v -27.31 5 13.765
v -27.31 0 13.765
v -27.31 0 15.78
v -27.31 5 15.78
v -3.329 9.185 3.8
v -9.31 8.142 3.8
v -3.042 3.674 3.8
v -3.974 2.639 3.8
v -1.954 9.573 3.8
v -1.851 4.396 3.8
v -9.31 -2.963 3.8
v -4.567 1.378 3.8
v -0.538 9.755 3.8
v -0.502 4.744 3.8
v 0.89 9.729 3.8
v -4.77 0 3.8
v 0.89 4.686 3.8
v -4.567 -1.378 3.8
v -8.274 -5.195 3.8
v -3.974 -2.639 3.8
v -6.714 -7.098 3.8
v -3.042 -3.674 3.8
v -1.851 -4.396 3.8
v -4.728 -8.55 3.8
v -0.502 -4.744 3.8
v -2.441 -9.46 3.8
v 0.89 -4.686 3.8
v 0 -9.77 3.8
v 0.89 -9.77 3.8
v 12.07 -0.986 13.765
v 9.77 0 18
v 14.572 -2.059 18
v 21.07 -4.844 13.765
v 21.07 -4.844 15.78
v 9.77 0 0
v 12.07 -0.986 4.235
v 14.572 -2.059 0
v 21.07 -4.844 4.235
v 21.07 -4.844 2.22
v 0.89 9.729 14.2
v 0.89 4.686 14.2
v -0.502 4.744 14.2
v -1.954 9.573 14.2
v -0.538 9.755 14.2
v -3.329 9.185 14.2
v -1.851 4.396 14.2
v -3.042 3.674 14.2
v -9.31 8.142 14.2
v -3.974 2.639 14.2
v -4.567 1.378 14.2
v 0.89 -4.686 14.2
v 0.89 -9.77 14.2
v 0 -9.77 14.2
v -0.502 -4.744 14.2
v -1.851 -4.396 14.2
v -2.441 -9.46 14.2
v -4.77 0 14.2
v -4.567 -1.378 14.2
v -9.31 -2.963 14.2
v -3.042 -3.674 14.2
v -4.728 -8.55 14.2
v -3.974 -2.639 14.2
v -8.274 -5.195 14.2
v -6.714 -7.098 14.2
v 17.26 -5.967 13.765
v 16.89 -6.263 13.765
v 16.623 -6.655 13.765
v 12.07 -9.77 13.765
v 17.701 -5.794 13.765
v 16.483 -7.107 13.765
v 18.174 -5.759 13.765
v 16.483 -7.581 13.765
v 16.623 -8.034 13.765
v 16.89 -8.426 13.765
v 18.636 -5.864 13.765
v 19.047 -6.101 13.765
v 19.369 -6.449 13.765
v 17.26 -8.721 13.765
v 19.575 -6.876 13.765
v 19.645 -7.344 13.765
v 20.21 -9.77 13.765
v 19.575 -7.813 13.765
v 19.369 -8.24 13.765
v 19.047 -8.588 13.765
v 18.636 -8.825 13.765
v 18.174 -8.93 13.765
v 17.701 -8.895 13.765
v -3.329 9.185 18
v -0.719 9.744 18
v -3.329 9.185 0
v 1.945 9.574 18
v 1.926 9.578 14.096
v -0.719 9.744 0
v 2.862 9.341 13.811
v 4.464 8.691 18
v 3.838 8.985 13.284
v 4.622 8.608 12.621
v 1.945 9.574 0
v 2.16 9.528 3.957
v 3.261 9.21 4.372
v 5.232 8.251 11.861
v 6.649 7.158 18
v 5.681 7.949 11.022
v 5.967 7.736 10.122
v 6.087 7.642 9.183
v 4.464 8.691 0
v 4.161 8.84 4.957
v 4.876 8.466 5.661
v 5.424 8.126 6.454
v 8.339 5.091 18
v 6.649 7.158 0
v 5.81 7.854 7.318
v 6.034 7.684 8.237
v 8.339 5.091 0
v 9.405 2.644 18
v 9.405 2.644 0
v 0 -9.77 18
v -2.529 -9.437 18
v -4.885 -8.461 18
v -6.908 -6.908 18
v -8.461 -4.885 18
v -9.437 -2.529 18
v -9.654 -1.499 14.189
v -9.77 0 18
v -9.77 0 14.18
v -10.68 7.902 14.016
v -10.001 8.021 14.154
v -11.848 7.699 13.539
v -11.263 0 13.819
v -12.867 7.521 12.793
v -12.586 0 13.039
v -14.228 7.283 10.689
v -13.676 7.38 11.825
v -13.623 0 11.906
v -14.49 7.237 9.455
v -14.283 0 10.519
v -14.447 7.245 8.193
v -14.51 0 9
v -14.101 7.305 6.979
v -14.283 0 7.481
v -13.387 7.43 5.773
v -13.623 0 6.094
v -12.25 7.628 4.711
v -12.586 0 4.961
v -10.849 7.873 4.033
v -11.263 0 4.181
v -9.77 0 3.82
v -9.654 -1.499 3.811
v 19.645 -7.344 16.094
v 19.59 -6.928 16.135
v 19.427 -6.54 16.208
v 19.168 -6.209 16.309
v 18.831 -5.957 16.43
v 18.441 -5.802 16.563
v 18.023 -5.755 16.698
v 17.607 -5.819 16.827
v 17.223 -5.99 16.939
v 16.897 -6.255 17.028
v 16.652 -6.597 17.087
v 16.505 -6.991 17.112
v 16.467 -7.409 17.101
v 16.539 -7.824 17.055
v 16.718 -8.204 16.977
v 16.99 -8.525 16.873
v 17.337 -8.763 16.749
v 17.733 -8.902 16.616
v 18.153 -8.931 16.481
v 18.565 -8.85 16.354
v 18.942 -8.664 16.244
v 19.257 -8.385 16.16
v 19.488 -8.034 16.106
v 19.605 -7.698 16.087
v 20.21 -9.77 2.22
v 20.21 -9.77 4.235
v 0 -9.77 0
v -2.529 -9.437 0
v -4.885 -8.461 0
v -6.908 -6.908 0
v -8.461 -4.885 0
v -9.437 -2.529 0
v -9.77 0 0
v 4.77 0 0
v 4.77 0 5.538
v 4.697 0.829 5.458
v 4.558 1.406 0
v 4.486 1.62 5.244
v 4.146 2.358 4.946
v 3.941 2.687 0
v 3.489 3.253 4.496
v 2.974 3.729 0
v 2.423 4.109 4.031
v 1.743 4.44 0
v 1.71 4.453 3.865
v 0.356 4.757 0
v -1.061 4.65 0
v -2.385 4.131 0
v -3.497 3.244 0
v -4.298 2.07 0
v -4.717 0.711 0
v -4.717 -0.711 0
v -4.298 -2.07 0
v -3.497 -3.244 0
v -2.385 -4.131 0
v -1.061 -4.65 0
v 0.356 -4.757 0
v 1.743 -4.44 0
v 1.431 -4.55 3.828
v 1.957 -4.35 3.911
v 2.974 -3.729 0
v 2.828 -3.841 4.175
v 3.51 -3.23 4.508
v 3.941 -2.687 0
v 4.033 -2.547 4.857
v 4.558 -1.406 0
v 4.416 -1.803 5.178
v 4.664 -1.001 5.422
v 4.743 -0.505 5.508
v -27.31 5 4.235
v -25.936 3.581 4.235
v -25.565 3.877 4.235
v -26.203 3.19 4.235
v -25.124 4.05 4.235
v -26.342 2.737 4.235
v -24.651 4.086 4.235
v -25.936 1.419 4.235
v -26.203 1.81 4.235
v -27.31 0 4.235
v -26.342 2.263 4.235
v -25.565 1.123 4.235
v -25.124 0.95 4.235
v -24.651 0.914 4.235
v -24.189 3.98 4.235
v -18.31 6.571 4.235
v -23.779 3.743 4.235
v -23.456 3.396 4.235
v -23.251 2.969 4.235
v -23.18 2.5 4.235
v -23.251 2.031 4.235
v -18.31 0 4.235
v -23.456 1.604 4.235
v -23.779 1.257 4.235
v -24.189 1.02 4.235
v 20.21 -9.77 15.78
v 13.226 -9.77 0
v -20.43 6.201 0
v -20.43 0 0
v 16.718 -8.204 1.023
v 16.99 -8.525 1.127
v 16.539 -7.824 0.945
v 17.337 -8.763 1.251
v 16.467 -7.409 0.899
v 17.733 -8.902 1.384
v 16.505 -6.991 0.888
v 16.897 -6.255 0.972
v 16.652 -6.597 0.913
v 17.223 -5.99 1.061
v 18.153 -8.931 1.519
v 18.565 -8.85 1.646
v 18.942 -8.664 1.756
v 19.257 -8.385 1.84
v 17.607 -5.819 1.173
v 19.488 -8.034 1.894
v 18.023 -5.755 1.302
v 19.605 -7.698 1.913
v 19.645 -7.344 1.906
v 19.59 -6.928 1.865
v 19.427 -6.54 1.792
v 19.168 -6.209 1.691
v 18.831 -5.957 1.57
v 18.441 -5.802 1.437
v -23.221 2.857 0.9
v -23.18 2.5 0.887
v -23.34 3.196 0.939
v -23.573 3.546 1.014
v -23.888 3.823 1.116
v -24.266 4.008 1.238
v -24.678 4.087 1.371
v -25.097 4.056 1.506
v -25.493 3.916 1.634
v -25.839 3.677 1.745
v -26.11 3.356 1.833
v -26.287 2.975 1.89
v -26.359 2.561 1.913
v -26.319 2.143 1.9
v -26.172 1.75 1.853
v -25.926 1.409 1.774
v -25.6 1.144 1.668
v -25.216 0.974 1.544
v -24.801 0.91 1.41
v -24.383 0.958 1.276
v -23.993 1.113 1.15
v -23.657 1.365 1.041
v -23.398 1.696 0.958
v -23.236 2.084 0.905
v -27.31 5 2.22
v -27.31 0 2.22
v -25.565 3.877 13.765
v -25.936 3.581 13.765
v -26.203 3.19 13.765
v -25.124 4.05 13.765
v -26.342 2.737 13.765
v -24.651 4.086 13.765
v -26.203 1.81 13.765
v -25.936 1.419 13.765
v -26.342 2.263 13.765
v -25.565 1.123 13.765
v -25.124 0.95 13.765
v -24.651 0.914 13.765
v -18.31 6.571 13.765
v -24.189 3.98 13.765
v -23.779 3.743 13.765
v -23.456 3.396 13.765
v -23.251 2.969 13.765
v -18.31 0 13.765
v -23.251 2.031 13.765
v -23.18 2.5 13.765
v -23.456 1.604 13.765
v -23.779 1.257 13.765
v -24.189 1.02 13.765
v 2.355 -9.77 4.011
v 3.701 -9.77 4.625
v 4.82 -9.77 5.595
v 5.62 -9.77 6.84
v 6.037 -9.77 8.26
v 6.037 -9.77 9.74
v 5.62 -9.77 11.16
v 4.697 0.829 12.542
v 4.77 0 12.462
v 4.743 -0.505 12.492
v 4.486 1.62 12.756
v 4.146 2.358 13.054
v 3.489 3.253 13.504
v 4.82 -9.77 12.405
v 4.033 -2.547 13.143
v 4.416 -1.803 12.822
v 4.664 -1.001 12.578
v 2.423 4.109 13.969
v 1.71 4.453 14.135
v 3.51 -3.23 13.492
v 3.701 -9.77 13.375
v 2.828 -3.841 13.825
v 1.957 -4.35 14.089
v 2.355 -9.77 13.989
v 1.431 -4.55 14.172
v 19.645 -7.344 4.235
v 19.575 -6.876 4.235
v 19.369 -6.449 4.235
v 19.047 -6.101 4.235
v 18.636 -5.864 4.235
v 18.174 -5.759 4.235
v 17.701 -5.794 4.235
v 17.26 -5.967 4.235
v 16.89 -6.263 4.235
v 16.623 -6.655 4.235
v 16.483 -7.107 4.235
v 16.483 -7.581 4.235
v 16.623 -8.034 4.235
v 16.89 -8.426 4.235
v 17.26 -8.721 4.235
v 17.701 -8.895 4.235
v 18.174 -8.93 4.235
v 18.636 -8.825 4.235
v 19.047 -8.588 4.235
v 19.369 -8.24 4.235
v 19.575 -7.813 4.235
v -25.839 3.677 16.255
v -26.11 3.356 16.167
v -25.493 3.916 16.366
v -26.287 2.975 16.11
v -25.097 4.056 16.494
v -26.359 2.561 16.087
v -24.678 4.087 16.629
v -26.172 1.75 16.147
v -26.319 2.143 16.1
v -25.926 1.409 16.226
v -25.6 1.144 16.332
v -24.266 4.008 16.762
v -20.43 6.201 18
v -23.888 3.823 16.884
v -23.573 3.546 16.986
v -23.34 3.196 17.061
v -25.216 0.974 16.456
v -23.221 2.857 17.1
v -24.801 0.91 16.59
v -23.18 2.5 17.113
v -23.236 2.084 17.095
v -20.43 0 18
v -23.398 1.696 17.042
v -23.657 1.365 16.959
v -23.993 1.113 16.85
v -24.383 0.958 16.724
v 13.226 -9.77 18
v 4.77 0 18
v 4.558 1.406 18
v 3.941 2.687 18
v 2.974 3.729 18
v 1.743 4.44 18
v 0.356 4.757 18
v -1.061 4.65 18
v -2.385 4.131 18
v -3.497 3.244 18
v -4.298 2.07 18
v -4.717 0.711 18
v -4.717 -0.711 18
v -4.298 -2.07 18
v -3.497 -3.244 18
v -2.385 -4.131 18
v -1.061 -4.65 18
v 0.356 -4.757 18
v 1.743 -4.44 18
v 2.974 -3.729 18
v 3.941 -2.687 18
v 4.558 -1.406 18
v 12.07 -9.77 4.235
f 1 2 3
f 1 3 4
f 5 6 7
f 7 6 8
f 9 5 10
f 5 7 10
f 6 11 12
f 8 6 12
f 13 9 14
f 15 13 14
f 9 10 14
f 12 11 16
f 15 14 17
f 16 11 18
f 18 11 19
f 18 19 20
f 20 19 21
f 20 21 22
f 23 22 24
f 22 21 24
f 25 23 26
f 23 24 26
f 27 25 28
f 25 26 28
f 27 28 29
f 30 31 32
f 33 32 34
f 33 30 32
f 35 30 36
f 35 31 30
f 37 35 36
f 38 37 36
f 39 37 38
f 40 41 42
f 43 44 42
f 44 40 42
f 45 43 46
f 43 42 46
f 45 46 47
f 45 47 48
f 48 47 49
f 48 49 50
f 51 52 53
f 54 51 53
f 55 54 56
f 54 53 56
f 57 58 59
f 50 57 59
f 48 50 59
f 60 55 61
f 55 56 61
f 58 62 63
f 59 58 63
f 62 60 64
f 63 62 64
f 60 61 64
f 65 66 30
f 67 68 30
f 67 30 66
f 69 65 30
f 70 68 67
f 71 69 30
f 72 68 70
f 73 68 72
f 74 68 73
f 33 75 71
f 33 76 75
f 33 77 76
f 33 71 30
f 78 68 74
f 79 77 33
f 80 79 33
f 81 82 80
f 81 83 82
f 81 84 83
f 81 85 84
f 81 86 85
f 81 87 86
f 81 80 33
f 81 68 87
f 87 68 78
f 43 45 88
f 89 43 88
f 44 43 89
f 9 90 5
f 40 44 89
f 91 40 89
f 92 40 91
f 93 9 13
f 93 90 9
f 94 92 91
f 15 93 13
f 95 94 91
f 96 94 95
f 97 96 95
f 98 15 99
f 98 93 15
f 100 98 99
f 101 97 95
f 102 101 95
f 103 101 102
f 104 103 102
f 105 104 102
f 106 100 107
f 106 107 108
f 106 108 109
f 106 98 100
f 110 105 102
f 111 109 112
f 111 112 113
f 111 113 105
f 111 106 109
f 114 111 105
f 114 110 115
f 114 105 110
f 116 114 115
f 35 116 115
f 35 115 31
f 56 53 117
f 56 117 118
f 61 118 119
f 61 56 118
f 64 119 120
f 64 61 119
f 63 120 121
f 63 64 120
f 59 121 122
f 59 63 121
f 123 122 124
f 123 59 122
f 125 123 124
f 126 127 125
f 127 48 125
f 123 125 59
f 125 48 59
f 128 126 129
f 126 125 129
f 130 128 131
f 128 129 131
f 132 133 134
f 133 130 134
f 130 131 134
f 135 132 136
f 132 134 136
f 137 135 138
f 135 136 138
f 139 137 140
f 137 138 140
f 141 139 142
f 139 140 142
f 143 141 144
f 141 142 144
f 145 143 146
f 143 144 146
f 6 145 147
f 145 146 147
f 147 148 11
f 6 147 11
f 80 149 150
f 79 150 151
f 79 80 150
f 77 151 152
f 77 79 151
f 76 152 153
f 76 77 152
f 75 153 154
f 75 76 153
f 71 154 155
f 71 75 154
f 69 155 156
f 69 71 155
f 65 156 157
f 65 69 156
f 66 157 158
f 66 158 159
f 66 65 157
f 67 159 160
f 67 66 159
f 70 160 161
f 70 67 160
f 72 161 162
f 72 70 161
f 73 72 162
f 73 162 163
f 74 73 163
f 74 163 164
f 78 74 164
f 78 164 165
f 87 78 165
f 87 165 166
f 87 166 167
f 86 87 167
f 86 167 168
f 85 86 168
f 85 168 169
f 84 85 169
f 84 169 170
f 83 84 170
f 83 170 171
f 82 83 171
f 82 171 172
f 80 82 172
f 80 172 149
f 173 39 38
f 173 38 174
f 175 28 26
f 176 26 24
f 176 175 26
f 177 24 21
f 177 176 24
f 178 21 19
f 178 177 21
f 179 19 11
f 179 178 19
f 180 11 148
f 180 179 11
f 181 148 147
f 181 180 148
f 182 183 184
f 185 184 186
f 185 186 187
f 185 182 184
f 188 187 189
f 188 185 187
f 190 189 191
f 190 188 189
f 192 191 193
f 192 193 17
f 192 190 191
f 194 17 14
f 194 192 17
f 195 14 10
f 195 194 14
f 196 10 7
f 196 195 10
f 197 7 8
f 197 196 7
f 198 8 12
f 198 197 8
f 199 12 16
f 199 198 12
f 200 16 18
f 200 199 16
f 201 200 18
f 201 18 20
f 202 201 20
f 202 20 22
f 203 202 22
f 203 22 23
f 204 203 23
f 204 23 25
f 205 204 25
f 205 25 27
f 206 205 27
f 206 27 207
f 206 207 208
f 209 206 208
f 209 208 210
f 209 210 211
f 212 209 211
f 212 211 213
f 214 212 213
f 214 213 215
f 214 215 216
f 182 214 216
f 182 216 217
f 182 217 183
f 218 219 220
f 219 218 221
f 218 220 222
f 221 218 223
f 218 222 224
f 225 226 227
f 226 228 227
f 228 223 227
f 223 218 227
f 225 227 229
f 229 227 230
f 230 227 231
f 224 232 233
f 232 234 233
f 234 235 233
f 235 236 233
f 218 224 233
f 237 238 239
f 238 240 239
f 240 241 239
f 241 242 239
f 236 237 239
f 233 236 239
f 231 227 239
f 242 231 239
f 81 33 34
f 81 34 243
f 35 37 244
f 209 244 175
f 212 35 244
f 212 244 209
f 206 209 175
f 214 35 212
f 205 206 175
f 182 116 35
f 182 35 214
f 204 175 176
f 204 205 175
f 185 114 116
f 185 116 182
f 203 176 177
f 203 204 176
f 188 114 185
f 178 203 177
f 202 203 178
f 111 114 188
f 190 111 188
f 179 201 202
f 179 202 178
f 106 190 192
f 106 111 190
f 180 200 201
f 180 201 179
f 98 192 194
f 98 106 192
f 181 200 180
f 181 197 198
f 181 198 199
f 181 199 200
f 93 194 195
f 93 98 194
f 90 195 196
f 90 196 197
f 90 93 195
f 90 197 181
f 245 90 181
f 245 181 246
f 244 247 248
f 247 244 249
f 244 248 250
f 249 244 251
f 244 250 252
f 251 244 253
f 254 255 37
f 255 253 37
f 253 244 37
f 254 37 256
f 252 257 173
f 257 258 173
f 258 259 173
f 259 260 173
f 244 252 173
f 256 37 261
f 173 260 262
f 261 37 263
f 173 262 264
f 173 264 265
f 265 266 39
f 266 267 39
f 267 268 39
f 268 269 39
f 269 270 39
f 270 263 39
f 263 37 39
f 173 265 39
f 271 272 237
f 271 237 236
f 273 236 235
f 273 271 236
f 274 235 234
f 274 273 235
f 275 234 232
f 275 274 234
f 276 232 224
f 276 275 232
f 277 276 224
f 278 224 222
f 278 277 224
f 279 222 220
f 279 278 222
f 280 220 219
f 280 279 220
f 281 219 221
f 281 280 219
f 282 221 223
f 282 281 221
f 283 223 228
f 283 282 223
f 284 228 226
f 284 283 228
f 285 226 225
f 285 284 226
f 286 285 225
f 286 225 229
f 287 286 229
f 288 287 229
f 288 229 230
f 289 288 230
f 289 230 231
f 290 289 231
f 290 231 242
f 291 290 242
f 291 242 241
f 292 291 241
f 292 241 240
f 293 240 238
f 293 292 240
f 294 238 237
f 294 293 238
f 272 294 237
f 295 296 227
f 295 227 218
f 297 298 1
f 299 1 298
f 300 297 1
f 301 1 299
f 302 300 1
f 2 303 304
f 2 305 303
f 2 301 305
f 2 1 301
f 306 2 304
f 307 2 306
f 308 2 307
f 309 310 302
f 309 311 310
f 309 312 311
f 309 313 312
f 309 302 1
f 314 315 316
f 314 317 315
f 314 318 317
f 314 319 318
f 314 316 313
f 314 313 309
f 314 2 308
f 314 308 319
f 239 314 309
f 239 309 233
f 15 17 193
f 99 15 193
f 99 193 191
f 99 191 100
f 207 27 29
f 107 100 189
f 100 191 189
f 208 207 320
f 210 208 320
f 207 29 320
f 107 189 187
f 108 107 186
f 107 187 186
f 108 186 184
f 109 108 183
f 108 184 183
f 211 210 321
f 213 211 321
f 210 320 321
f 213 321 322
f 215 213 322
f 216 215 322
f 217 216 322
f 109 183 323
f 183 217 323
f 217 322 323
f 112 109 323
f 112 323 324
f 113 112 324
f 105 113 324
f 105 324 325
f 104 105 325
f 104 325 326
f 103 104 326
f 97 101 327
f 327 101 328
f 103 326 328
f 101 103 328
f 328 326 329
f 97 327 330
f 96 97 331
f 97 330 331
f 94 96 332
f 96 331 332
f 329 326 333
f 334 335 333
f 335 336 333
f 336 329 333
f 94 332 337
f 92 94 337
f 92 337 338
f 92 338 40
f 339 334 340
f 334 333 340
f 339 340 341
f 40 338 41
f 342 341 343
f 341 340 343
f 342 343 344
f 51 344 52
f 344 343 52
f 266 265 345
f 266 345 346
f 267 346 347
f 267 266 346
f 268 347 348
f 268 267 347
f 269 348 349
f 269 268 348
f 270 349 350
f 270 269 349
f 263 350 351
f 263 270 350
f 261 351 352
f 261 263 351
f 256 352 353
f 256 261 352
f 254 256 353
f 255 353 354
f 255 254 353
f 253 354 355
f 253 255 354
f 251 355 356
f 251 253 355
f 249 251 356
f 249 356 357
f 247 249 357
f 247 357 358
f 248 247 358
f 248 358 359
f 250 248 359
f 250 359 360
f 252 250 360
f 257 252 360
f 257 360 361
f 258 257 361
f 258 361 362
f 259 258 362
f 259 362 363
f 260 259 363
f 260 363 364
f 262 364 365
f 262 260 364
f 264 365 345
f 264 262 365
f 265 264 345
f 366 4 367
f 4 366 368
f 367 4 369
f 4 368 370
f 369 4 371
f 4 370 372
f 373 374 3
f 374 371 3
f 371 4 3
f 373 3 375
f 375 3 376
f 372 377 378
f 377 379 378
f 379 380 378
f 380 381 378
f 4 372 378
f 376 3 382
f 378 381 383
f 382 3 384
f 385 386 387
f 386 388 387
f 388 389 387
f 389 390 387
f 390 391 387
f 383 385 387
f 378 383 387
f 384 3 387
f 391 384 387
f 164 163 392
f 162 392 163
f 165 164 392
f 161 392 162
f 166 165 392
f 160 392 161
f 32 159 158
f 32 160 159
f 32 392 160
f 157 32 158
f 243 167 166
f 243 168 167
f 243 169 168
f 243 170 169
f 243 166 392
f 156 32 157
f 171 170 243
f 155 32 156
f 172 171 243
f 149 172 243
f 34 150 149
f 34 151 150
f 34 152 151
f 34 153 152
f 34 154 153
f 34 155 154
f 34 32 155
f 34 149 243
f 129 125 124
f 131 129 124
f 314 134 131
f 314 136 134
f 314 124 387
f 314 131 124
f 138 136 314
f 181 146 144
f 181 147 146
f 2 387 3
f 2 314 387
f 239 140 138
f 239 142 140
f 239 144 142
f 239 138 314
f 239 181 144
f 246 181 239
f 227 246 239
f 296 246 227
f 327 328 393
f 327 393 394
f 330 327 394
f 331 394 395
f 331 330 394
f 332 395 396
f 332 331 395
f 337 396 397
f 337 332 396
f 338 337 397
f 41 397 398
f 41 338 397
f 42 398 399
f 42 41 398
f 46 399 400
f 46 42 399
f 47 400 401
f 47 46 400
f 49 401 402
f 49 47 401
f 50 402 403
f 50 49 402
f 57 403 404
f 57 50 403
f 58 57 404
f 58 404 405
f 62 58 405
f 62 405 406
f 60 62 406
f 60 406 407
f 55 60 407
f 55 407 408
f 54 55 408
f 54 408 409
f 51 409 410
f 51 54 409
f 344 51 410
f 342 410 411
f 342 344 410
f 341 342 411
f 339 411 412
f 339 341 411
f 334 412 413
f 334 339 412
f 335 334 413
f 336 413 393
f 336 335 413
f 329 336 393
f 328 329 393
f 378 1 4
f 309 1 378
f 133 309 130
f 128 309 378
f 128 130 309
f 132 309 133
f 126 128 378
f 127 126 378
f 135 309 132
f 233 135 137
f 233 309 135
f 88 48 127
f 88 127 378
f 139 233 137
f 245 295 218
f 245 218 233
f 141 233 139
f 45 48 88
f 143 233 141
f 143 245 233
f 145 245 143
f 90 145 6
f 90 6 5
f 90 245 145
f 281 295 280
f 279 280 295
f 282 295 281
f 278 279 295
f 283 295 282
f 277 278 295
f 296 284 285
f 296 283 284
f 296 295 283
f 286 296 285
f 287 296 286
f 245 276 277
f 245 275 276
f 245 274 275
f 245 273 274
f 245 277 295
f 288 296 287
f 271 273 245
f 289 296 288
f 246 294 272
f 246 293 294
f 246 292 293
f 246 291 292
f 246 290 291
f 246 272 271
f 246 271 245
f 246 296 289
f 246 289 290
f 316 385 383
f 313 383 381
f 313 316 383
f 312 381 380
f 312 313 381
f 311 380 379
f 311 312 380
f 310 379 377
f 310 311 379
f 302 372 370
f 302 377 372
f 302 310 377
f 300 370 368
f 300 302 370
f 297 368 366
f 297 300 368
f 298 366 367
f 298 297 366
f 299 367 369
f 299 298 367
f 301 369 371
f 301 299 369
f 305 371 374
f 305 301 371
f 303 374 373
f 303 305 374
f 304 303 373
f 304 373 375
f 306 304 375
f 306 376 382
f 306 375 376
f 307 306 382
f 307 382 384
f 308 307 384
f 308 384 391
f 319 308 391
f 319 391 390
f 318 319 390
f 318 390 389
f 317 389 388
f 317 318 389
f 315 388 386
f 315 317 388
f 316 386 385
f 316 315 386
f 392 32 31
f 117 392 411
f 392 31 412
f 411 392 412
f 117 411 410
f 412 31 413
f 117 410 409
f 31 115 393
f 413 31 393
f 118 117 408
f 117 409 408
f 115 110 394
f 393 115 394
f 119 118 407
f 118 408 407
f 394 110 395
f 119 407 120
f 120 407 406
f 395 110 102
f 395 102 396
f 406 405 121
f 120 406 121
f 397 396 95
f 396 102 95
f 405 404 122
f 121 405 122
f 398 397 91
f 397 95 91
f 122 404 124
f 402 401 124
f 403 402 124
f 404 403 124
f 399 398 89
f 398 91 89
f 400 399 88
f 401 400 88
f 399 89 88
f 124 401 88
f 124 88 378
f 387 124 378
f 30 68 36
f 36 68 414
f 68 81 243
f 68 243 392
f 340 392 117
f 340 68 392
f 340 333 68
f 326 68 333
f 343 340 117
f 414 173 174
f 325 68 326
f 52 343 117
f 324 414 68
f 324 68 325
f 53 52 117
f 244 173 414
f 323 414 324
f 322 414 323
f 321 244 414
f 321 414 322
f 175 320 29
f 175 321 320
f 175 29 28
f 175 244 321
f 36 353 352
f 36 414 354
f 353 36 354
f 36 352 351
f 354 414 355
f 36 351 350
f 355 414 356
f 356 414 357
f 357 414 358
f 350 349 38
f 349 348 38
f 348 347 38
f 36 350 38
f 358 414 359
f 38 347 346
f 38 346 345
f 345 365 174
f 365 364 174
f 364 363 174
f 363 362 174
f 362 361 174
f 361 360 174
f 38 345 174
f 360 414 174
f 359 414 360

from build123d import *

# Parameters (mm, degrees)
SKETCH1_R               = 4.77
SKETCH1_R_2             = 1.59
BOSS_EXTRUDE1_DEPTH     = 18
CHAMFER1_SIZE           = 2.22
CHAMFER1_SIZE_2         = 6.88
CHAMFER2_SIZE           = 6.88
CHAMFER2_SIZE_2         = 2.22
CUT_EXTRUDE1_DEPTH      = 35.136329621
CUT_EXTRUDE1_DEPTH_BACK = 35.136329621
SKETCH3_W               = 9
SKETCH3_H               = 9.53


with BuildPart() as part:
    # Sketch1 → Boss-Extrude1 (new body)
    with BuildSketch(Plane.XY):
        with BuildLine():
            Line((-27.31, 0), (-27.31, 5))
            Line((-27.31, 5), (-3.328977305, 9.185358464))
            ThreePointArc((-3.328977305, 9.185358464), (5.609313315, 7.999281476), (9.77, 0))
            Line((9.77, 0), (21.07, -4.844453369))
            Line((21.07, -4.844453369), (20.210354499, -9.77))
            Line((20.210354499, -9.77), (0, -9.77))
            ThreePointArc((0, -9.77), (-6.908433252, -6.908433252), (-9.77, 0))
            Line((-9.77, 0), (-27.31, 0))
        make_face()
        Circle(SKETCH1_R, mode=Mode.SUBTRACT)
        with Locations((-24.77, 2.5)):
            Circle(SKETCH1_R_2, mode=Mode.SUBTRACT)
        with Locations((18.055286128, -7.344453369)):
            Circle(SKETCH1_R_2, mode=Mode.SUBTRACT)
    extrude(amount=BOSS_EXTRUDE1_DEPTH)

    # Chamfer1
    # the kernel refuses this chamfer: 6.88, 2.22 mm, written as the material it takes off along each edge
    with BuildSketch(Plane(origin=(-27.31, -17.856007533, 18), x_dir=(-0.11292116623223689, 0, -0.9936039503830244), z_dir=(0, 1, 0))) as chamfer1_piece_1:
        Polygon((CHAMFER1_SIZE * 0.993603950383, -CHAMFER1_SIZE * 0.112921166232), (-CHAMFER1_SIZE_2 * 0.112921166232, -CHAMFER1_SIZE_2 * 0.993603950383), (0, 0), align=None)
    extrude(amount=40.712015065, mode=Mode.SUBTRACT)
    with BuildSketch(Plane(origin=(-27.31, -17.856007533, 0), x_dir=(-0.1129211662322369, 0, 0.9936039503830242), z_dir=(0, 1, 0))) as chamfer1_piece_2:
        Polygon((CHAMFER1_SIZE * 0.993603950383, CHAMFER1_SIZE * 0.112921166232), (-CHAMFER1_SIZE_2 * 0.112921166232, CHAMFER1_SIZE_2 * 0.993603950383), (0, 0), align=None)
    extrude(amount=40.712015065, mode=Mode.SUBTRACT)

    # Chamfer2
    # the kernel refuses this chamfer: 6.88, 2.22 mm, written as the material it takes off along each edge
    with BuildSketch(Plane(origin=(24.13996731, 12.745666179, 0), x_dir=(-0.9850403671370294, 0.1719170650041742, -0.011832069594835619), z_dir=(-0.17192910027940936, -0.985109326154774, 0))) as chamfer2_piece_1:
        Polygon((CHAMFER2_SIZE * 0.999929998614, -CHAMFER2_SIZE * 0.0118320695948), (-CHAMFER2_SIZE_2 * 0.0118320695948, -CHAMFER2_SIZE_2 * 0.999929998614), (0, 0), align=None)
    extrude(amount=40.712015065, mode=Mode.SUBTRACT)
    with BuildSketch(Plane(origin=(24.13996731, 12.745666179, 18), x_dir=(-0.9850403671370294, 0.1719170650041742, 0.011832069594835435), z_dir=(-0.17192910027940936, -0.985109326154774, 0))) as chamfer2_piece_2:
        Polygon((CHAMFER2_SIZE * 0.999929998614, CHAMFER2_SIZE * 0.0118320695948), (-CHAMFER2_SIZE_2 * 0.0118320695948, CHAMFER2_SIZE_2 * 0.999929998614), (0, 0), align=None)
    extrude(amount=40.712015065, mode=Mode.SUBTRACT)

    # Sketch3 → Cut-Extrude1 (cut, two sides: drawn at the far end of the back side and taken through both)
    with BuildSketch(Plane(origin=(0, 0, 0), x_dir=(1, 0, 0), z_dir=(0, 1, 0)).offset(-CUT_EXTRUDE1_DEPTH_BACK)):
        with Locations((-22.81, -9)):
            Rectangle(SKETCH3_W, SKETCH3_H)
        with BuildLine():
            Line((-9.31, -3.8), (0.89, -3.8))
            ThreePointArc((0.89, -3.8), (6.09, -9), (0.89, -14.2))
            Line((0.89, -14.2), (-9.31, -14.2))
            ThreePointArc((-9.31, -14.2), (-14.51, -9), (-9.31, -3.8))
        make_face()
        with Locations((16.57, -9)):
            Rectangle(SKETCH3_W, SKETCH3_H)
    extrude(amount=CUT_EXTRUDE1_DEPTH + CUT_EXTRUDE1_DEPTH_BACK, mode=Mode.SUBTRACT)


solid = part.part
